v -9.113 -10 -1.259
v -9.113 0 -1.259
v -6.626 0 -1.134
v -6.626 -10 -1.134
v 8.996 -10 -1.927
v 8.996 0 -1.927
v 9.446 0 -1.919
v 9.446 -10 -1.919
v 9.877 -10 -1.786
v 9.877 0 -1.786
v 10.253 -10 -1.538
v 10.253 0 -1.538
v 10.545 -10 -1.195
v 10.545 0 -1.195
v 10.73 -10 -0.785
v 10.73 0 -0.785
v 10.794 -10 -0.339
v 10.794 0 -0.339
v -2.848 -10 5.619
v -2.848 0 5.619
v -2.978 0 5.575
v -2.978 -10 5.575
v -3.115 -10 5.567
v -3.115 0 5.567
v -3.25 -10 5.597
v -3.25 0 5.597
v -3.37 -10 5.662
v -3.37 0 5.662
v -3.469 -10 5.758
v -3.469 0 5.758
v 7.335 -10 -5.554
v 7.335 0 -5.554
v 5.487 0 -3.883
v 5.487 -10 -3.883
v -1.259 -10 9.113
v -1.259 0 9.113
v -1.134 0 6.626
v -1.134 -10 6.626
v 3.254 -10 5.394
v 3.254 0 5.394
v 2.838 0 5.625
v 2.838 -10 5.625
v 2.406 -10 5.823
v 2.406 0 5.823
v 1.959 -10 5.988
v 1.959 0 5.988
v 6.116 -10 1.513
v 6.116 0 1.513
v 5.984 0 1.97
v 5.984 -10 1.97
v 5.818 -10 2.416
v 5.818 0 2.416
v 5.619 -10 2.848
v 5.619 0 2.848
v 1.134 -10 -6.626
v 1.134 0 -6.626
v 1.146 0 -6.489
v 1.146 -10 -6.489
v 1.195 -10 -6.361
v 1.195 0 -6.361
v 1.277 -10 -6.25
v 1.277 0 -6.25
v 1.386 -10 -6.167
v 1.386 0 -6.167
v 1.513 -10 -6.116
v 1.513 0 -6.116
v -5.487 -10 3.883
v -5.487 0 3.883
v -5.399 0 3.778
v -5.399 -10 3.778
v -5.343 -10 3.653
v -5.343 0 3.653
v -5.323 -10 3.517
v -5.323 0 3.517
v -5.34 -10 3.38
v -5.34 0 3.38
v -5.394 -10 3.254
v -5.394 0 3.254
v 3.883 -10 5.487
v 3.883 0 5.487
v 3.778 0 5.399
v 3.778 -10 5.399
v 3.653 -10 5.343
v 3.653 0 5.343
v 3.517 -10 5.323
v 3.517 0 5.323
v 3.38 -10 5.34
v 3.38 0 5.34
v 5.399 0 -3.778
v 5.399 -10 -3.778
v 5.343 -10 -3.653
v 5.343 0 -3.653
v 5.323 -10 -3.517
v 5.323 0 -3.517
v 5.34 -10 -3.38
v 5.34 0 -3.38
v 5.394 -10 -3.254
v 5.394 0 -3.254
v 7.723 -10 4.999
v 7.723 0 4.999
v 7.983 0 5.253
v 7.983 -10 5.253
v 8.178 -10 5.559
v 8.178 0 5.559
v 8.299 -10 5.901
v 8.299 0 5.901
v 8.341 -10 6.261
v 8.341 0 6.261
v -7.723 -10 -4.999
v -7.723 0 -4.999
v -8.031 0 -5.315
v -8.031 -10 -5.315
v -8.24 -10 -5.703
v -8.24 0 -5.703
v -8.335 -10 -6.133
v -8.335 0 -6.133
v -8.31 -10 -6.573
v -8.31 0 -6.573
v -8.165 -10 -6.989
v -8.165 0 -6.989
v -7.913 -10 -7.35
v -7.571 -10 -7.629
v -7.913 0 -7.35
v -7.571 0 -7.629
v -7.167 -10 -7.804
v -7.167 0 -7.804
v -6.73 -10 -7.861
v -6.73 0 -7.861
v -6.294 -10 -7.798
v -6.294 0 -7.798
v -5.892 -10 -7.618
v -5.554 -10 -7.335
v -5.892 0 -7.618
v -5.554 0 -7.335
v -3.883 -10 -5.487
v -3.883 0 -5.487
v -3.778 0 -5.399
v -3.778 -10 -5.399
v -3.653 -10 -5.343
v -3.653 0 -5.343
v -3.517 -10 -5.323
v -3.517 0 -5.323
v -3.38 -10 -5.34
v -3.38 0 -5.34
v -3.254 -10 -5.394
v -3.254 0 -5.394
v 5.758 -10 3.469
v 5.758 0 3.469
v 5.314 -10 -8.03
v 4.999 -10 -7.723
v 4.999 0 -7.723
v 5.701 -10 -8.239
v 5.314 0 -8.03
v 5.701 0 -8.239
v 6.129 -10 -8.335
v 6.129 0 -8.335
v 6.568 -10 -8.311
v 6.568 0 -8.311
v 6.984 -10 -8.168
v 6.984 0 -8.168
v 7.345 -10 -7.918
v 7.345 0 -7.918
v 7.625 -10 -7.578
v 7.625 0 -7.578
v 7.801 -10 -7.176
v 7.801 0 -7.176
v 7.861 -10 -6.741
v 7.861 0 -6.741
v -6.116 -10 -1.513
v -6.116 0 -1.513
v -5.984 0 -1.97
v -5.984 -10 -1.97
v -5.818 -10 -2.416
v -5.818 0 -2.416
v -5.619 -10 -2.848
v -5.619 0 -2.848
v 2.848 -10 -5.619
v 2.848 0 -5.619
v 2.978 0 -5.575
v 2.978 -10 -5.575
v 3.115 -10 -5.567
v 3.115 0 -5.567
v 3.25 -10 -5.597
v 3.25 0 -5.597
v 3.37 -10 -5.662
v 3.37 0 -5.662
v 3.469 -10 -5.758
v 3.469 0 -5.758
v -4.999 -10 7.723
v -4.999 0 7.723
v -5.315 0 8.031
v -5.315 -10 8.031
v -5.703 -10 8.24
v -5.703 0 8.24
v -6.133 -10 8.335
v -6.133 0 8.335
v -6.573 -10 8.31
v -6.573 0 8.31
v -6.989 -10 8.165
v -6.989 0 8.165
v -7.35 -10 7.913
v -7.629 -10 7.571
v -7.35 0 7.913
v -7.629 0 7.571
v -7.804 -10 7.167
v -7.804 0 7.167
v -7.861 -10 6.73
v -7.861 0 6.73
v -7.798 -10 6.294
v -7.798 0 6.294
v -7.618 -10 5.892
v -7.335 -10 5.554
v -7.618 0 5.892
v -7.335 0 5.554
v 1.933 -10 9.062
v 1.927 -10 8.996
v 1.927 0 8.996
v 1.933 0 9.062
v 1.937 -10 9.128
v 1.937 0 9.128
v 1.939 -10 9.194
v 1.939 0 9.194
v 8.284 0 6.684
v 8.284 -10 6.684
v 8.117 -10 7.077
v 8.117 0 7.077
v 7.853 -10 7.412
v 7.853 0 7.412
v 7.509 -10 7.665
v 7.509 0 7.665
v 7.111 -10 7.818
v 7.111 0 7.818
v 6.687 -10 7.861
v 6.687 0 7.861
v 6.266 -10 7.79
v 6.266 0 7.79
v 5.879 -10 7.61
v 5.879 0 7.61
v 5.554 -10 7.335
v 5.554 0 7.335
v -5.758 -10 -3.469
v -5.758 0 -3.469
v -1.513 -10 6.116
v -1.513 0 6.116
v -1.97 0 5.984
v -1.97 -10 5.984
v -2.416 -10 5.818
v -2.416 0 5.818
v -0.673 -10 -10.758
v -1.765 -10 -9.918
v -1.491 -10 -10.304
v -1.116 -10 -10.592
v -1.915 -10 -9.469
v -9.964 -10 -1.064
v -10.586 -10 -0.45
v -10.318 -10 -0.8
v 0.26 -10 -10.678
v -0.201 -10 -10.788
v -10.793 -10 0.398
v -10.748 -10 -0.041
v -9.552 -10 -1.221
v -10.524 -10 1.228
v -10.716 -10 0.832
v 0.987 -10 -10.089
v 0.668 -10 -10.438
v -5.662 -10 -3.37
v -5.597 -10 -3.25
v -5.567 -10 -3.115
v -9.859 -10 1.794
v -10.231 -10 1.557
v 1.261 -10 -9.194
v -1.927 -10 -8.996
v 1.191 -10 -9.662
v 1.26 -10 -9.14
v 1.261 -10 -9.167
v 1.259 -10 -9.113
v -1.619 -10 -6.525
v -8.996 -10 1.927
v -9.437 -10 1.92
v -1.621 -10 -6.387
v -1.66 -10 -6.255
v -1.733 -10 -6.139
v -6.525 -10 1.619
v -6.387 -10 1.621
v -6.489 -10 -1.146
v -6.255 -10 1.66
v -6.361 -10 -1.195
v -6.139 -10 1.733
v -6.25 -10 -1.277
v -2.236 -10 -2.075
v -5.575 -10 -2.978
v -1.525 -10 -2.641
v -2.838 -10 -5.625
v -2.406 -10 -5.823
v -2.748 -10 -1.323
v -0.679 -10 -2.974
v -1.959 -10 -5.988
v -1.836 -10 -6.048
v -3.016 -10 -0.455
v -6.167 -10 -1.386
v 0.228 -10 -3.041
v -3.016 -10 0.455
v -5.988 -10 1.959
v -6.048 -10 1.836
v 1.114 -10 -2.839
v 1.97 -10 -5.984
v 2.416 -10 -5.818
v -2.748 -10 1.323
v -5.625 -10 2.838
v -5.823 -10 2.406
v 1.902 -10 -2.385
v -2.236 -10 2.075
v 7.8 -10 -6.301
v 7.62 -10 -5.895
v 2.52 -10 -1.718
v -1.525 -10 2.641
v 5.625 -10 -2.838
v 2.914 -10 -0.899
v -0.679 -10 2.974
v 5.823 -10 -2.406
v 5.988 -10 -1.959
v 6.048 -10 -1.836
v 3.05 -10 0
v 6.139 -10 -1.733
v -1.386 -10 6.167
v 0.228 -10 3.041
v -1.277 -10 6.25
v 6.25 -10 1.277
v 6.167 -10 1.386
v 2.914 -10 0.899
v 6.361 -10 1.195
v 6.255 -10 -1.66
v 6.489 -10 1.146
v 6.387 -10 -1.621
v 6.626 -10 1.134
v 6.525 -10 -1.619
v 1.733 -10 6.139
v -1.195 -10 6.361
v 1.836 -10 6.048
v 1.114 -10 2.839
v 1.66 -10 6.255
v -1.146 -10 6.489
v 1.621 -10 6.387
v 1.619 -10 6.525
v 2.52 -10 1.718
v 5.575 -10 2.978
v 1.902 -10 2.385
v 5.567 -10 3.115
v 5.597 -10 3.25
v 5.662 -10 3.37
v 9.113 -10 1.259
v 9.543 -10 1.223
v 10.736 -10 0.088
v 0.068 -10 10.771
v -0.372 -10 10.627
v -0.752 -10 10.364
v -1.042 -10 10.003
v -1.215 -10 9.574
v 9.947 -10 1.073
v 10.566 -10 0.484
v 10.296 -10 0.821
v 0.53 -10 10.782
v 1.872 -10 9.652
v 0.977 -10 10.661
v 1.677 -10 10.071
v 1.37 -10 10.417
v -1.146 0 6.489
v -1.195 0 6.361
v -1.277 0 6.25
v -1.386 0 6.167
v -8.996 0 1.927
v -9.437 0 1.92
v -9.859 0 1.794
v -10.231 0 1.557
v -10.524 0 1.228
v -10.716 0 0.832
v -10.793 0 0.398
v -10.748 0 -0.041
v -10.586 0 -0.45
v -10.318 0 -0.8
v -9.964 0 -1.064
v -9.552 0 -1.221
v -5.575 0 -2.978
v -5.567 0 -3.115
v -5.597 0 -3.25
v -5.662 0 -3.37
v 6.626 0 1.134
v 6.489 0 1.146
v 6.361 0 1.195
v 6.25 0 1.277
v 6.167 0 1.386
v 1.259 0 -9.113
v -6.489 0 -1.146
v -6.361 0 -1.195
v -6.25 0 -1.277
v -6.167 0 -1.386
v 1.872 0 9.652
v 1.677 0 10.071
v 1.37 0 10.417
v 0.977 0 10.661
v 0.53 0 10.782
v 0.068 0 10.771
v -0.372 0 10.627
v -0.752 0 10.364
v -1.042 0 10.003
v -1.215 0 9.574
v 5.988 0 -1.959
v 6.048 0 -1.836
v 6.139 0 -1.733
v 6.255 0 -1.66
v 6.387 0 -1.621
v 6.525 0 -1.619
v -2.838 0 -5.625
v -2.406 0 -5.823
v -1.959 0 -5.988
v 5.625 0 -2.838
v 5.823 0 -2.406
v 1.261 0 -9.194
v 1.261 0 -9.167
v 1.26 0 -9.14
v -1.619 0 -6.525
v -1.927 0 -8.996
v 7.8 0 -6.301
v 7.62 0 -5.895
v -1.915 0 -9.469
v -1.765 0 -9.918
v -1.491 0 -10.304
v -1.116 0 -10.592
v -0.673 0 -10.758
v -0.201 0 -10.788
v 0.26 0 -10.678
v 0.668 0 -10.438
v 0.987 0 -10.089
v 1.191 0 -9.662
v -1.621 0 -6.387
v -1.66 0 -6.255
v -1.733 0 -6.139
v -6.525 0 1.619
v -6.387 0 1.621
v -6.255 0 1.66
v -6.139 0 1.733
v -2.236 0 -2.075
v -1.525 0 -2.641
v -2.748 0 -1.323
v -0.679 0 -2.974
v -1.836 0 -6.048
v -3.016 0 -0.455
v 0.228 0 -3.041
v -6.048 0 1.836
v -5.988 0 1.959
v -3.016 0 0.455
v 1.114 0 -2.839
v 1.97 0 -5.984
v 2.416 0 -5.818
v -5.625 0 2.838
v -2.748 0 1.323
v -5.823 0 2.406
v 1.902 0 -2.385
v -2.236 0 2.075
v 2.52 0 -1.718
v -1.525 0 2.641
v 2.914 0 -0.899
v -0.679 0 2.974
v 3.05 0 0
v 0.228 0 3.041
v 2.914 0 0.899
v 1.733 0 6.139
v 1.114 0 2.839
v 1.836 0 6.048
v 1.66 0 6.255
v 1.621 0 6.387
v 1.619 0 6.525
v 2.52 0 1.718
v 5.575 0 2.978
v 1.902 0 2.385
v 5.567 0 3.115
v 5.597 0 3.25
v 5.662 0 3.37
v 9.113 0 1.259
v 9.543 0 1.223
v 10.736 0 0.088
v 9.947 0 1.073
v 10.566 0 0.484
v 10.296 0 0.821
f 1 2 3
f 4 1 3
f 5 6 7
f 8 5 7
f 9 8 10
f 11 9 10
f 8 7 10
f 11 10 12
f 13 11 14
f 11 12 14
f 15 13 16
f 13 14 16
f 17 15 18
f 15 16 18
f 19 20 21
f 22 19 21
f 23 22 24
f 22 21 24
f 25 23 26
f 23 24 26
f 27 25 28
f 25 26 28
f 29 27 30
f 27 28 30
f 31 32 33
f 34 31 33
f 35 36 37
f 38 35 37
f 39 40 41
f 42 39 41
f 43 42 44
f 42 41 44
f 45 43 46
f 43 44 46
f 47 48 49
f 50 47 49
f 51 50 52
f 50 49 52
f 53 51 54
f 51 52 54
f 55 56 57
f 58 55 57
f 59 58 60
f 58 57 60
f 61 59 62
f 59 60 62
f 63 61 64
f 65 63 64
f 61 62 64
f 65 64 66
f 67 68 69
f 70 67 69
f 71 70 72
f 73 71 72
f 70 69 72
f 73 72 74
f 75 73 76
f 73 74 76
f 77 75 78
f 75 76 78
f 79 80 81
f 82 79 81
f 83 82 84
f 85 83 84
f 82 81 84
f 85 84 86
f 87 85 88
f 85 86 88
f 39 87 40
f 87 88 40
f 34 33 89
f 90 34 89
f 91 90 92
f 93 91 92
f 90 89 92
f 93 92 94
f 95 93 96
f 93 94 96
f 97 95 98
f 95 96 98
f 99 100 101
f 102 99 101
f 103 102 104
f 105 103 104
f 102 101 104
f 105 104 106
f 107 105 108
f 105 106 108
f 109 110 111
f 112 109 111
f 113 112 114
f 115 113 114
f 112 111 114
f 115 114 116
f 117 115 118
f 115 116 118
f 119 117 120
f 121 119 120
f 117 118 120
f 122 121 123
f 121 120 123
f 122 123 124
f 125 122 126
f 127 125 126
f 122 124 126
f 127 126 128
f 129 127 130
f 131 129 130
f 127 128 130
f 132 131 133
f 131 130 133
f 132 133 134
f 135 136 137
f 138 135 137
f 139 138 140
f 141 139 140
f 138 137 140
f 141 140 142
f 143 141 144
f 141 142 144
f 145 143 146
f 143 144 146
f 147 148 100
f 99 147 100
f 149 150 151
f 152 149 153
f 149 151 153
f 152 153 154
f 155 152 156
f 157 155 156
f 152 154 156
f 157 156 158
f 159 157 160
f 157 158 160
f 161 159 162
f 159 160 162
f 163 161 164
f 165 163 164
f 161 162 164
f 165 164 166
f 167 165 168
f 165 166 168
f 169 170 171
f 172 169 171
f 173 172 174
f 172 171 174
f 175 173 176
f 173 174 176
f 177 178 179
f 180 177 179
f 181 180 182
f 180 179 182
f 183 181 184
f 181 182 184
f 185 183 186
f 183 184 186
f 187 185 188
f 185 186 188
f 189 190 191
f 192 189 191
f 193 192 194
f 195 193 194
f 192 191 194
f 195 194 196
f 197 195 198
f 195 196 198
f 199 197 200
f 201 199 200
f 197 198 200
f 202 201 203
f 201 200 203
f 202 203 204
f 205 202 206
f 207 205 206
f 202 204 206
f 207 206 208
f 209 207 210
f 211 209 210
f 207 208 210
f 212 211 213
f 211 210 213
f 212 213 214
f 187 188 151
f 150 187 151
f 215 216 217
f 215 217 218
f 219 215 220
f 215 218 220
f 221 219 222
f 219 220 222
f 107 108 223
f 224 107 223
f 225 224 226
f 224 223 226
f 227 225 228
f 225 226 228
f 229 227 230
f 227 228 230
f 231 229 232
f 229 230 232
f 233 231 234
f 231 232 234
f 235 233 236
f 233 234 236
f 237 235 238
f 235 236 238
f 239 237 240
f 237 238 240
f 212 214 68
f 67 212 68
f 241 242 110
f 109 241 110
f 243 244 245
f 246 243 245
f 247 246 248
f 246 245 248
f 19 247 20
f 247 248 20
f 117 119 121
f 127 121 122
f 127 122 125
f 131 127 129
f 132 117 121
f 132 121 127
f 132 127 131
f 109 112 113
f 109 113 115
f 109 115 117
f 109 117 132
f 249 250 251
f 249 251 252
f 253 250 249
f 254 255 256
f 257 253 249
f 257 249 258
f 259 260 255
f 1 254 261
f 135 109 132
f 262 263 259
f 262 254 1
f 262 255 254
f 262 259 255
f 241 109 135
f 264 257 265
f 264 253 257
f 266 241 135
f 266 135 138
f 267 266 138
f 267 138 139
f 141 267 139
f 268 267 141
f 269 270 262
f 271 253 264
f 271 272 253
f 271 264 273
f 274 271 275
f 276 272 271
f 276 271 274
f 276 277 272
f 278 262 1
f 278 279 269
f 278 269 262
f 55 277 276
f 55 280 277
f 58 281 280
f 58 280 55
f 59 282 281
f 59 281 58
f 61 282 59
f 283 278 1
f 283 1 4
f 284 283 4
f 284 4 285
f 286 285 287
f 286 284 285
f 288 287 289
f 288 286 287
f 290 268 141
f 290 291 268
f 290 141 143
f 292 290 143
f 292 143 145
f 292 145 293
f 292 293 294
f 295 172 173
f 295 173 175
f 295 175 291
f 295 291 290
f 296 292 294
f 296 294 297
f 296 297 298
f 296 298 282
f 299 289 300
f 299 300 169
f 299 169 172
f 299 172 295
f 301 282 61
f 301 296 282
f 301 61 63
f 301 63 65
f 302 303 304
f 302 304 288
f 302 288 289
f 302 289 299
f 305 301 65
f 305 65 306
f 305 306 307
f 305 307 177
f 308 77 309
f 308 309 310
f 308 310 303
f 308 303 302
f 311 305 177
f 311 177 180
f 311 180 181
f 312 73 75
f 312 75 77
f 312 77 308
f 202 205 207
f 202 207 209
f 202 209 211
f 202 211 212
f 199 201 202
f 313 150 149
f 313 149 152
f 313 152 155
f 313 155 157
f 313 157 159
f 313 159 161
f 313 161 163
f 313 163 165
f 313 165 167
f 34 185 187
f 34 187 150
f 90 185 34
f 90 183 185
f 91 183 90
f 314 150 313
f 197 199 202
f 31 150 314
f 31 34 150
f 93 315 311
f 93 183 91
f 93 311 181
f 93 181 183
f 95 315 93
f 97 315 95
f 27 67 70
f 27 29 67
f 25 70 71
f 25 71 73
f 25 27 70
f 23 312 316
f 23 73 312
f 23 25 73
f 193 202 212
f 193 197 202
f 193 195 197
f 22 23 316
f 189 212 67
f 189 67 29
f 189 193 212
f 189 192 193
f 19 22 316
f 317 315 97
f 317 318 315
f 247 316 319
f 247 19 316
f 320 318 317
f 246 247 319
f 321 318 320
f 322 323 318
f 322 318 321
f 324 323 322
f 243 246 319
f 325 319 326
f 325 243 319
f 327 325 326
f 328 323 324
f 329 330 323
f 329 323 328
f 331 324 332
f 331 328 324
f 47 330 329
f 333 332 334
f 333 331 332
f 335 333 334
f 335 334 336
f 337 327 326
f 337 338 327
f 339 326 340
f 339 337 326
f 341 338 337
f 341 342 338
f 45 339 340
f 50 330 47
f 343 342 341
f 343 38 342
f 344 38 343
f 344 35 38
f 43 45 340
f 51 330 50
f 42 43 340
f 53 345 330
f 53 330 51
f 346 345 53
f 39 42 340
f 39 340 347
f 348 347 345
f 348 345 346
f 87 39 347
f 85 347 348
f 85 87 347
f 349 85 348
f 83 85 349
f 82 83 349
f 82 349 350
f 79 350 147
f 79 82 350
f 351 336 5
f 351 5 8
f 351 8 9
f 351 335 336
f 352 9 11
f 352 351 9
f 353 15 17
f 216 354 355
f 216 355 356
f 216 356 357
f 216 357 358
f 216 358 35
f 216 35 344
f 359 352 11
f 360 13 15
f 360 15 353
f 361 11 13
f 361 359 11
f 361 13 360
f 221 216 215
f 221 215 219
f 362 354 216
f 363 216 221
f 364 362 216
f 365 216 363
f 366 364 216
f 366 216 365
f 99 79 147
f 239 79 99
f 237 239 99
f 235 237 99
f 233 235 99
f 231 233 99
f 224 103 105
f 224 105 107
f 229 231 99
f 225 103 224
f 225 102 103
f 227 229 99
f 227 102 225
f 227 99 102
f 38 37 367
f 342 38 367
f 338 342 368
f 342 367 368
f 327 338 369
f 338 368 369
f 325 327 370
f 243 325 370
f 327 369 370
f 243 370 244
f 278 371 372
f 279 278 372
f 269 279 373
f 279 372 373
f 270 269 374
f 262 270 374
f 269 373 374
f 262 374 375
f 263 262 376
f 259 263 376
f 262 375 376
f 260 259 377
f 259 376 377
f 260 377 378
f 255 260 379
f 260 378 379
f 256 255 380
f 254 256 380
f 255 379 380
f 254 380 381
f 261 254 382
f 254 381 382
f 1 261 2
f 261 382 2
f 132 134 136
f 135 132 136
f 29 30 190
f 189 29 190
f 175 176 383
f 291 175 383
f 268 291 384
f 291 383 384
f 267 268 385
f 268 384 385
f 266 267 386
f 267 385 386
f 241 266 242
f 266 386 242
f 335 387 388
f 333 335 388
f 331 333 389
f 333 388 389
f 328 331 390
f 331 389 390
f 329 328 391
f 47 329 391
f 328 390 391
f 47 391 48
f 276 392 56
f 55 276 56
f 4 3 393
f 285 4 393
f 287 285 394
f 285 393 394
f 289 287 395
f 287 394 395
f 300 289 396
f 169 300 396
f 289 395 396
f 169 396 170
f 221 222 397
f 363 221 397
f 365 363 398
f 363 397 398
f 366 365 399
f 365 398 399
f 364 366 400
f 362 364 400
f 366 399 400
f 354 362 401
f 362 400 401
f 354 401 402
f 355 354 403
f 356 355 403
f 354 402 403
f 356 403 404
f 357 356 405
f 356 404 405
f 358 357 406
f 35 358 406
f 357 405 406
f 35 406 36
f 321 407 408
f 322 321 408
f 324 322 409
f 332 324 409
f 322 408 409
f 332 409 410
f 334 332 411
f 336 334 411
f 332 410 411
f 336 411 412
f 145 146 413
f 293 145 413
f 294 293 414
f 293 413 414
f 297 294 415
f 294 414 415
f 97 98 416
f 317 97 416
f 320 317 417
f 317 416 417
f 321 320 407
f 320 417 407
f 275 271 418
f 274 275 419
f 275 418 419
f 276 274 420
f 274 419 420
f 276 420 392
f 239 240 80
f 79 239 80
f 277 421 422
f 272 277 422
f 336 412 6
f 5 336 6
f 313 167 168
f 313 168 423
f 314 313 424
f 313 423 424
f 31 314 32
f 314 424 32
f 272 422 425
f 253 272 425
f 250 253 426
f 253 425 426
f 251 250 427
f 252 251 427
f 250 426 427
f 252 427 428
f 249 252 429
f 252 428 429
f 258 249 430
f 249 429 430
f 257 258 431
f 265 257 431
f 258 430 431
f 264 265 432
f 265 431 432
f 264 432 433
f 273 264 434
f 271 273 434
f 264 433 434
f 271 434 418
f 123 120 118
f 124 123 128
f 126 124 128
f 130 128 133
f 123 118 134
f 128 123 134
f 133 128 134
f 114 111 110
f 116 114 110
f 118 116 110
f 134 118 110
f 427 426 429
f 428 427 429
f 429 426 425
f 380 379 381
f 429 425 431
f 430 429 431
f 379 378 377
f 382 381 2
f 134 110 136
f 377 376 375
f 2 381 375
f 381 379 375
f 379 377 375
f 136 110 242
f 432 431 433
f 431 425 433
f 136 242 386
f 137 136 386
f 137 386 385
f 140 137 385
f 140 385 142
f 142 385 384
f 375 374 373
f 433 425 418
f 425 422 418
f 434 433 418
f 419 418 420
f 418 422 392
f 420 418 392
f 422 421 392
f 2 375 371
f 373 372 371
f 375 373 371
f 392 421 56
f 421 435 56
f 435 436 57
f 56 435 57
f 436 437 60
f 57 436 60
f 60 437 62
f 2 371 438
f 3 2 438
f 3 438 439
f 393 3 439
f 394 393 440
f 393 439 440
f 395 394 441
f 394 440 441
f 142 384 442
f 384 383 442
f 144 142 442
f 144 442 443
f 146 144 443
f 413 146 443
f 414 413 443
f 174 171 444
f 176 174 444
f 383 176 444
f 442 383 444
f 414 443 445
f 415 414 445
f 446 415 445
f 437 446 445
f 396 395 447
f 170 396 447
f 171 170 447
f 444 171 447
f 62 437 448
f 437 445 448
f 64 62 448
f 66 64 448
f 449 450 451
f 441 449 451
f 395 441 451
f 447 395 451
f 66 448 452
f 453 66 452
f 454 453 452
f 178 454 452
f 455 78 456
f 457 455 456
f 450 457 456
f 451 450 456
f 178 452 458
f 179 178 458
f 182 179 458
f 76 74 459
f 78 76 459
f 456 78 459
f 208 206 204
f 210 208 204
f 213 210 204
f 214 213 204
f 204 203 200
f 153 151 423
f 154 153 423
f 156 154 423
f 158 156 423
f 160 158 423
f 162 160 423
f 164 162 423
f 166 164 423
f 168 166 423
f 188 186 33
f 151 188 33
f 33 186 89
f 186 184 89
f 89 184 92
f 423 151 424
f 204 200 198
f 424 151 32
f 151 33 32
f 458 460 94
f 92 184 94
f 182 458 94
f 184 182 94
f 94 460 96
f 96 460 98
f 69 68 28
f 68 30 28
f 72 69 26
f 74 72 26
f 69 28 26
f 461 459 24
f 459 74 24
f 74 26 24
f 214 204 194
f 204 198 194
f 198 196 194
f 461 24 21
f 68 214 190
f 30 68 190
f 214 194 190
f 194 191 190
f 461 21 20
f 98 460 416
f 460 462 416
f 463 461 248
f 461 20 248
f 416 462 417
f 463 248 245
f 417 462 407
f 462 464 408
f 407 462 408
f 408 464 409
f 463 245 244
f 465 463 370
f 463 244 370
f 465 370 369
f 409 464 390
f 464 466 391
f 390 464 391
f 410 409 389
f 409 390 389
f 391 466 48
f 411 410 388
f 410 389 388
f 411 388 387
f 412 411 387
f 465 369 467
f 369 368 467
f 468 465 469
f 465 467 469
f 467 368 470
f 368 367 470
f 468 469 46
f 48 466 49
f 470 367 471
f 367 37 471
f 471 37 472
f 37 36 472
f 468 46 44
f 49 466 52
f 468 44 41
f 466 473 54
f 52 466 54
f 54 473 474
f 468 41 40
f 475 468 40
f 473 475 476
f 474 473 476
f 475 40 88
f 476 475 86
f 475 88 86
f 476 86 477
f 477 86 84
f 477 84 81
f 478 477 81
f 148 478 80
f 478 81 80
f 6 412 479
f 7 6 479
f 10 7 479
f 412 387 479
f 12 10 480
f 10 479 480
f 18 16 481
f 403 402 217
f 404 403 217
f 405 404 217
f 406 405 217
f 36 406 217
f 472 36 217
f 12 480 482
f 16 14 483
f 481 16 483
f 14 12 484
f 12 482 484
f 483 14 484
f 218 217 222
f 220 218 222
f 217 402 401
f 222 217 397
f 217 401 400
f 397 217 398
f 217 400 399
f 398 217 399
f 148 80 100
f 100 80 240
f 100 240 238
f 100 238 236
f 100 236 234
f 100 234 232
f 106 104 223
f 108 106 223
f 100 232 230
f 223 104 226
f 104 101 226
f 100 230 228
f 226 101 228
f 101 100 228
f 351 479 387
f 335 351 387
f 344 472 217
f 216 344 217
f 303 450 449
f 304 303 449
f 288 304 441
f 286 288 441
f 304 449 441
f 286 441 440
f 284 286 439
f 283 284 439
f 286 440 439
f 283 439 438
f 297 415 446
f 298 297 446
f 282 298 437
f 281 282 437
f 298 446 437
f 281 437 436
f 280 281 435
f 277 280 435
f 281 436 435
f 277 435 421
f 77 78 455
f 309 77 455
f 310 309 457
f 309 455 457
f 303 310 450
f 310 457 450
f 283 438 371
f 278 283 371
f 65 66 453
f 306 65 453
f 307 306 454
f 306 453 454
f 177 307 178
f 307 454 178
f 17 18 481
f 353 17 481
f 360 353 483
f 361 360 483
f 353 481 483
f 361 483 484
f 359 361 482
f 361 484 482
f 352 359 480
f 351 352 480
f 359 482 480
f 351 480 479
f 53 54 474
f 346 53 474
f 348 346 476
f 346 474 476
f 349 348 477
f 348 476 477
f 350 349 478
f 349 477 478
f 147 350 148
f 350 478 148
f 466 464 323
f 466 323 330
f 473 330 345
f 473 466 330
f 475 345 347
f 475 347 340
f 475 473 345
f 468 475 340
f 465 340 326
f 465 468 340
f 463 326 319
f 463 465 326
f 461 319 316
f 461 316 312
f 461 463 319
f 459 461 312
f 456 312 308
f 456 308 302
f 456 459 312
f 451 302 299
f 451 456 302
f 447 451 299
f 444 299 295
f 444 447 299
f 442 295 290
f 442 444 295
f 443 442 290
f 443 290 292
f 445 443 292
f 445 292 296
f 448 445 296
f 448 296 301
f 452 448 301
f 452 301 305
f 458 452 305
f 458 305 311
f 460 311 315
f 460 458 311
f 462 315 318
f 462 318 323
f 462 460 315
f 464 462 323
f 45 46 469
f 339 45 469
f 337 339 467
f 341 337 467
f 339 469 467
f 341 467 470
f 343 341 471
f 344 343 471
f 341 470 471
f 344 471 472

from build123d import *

# Parameters (mm, degrees)
F0_R     = 3.05
F1_DEPTH = 10


with BuildPart() as f1:
    # F0 (on Front) → F1 (new body)
    with BuildSketch(Plane.XZ):
        with BuildLine():
            ThreePointArc((5.987557, -1.959377), (6.221399, -0.992066), (6.3, 0))
            ThreePointArc((6.3, 0), (6.25371, 0.762306), (6.115521, 1.513409))
            ThreePointArc((6.115521, 1.513409), (5.905269, 2.194948), (5.619331, 2.848354))
            ThreePointArc((5.619331, 2.848354), (4.615787, 4.287716), (3.254184, 5.394468))
            ThreePointArc((3.254184, 5.394468), (2.623594, 5.727718), (1.959377, 5.987557))
            ThreePointArc((1.959377, 5.987557), (0.231982, 6.295727), (-1.513409, 6.115521))
            ThreePointArc((-1.513409, 6.115521), (-2.194948, 5.905269), (-2.848354, 5.619331))
            ThreePointArc((-2.848354, 5.619331), (-4.287716, 4.615787), (-5.394468, 3.254184))
            ThreePointArc((-5.394468, 3.254184), (-5.727718, 2.623594), (-5.987557, 1.959377))
            ThreePointArc((-5.987557, 1.959377), (-6.295727, 0.231982), (-6.115521, -1.513409))
            ThreePointArc((-6.115521, -1.513409), (-5.905269, -2.194948), (-5.619331, -2.848354))
            ThreePointArc((-5.619331, -2.848354), (-4.615787, -4.287716), (-3.254184, -5.394468))
            ThreePointArc((-3.254184, -5.394468), (-2.623594, -5.727718), (-1.959377, -5.987557))
            ThreePointArc((-1.959377, -5.987557), (-0.231982, -6.295727), (1.513409, -6.115521))
            ThreePointArc((1.513409, -6.115521), (2.194948, -5.905269), (2.848354, -5.619331))
            ThreePointArc((2.848354, -5.619331), (4.287716, -4.615787), (5.394468, -3.254184))
            ThreePointArc((5.394468, -3.254184), (5.727718, -2.623594), (5.987557, -1.959377))
        make_face()
        Circle(F0_R, mode=Mode.SUBTRACT)
        with BuildLine():
            ThreePointArc((6.115521, 1.513409), (6.25371, 0.762306), (6.3, 0))
            ThreePointArc((6.3, 0), (6.221399, -0.992066), (5.987557, -1.959377))
            ThreePointArc((5.987557, -1.959377), (6.194917, -1.692674), (6.524551, -1.618716))
            Line((6.524551, -1.618716), (8.996032, -1.926502))
            ThreePointArc((8.996032, -1.926502), (7.594846, -0.279851), (9.113417, 1.259215))
            Line((9.113417, 1.259215), (6.625987, 1.134152))
            ThreePointArc((6.625987, 1.134152), (6.30269, 1.232169), (6.115521, 1.513409))
        make_face()
        with BuildLine():
            ThreePointArc((3.254184, 5.394468), (4.615787, 4.287716), (5.619331, 2.848354))
            ThreePointArc((5.619331, 2.848354), (5.577369, 3.183566), (5.758159, 3.468949))
            Line((5.758159, 3.468949), (7.723398, 4.998913))
            ThreePointArc((7.723398, 4.998913), (5.568251, 5.172483), (5.55376, 7.334559))
            Line((5.55376, 7.334559), (3.883314, 5.487247))
            ThreePointArc((3.883314, 5.487247), (3.585399, 5.32795), (3.254184, 5.394468))
        make_face()
        with BuildLine():
            ThreePointArc((5.487247, -3.883314), (5.32795, -3.585399), (5.394468, -3.254184))
            ThreePointArc((5.394468, -3.254184), (4.287716, -4.615787), (2.848354, -5.619331))
            ThreePointArc((2.848354, -5.619331), (3.183566, -5.577369), (3.468949, -5.758159))
            Line((3.468949, -5.758159), (4.998913, -7.723398))
            ThreePointArc((4.998913, -7.723398), (5.172483, -5.568251), (7.334559, -5.55376))
            Line((7.334559, -5.55376), (5.487247, -3.883314))
        make_face()
        with BuildLine():
            ThreePointArc((10.793761, -0.338767), (10.29636, 0.820662), (9.113417, 1.259215))
            ThreePointArc((9.113417, 1.259215), (7.594846, -0.279851), (8.996032, -1.926502))
            ThreePointArc((8.996032, -1.926502), (10.252919, -1.538009), (10.793761, -0.338767))
        make_face()
        with BuildLine():
            ThreePointArc((-1.513409, 6.115521), (0.231982, 6.295727), (1.959377, 5.987557))
            ThreePointArc((1.959377, 5.987557), (1.692674, 6.194917), (1.618716, 6.524551))
            Line((1.618716, 6.524551), (1.926502, 8.996032))
            ThreePointArc((1.926502, 8.996032), (0.279851, 7.594846), (-1.259215, 9.113417))
            Line((-1.259215, 9.113417), (-1.134152, 6.625987))
            ThreePointArc((-1.134152, 6.625987), (-1.232169, 6.30269), (-1.513409, 6.115521))
        make_face()
        with BuildLine():
            ThreePointArc((5.55376, 7.334559), (5.568251, 5.172483), (7.723398, 4.998913))
            ThreePointArc((7.723398, 4.998913), (8.17798, 5.558793), (8.340515, 6.261426))
            ThreePointArc((8.340515, 6.261426), (7.31549, 7.754545), (5.55376, 7.334559))
        make_face()
        with BuildLine():
            ThreePointArc((1.134152, -6.625987), (1.232169, -6.30269), (1.513409, -6.115521))
            ThreePointArc((1.513409, -6.115521), (-0.231982, -6.295727), (-1.959377, -5.987557))
            ThreePointArc((-1.959377, -5.987557), (-1.692674, -6.194917), (-1.618716, -6.524551))
            Line((-1.618716, -6.524551), (-1.926502, -8.996032))
            ThreePointArc((-1.926502, -8.996032), (-0.279851, -7.594846), (1.259215, -9.113417))
            Line((1.259215, -9.113417), (1.134152, -6.625987))
        make_face()
        with BuildLine():
            ThreePointArc((7.861426, -6.740515), (7.723789, -6.091289), (7.334559, -5.55376))
            ThreePointArc((7.334559, -5.55376), (5.172483, -5.568251), (4.998913, -7.723398))
            ThreePointArc((4.998913, -7.723398), (6.781031, -8.253793), (7.861426, -6.740515))
        make_face()
        with BuildLine():
            ThreePointArc((-5.394468, 3.254184), (-4.287716, 4.615787), (-2.848354, 5.619331))
            ThreePointArc((-2.848354, 5.619331), (-3.183566, 5.577369), (-3.468949, 5.758159))
            Line((-3.468949, 5.758159), (-4.998913, 7.723398))
            ThreePointArc((-4.998913, 7.723398), (-4.748148, 7.260119), (-4.661426, 6.740515))
            ThreePointArc((-4.661426, 6.740515), (-5.612201, 5.278152), (-7.334559, 5.55376))
            Line((-7.334559, 5.55376), (-5.487247, 3.883314))
            ThreePointArc((-5.487247, 3.883314), (-5.32795, 3.585399), (-5.394468, 3.254184))
        make_face()
        with BuildLine():
            ThreePointArc((-1.259215, 9.113417), (0.279851, 7.594846), (1.926502, 8.996032))
            ThreePointArc((1.926502, 8.996032), (1.935698, 9.094706), (1.938767, 9.193761))
            ThreePointArc((1.938767, 9.193761), (0.298582, 10.793256), (-1.259215, 9.113417))
        make_face()
        with BuildLine():
            ThreePointArc((-3.883314, -5.487247), (-3.585399, -5.32795), (-3.254184, -5.394468))
            ThreePointArc((-3.254184, -5.394468), (-4.615787, -4.287716), (-5.619331, -2.848354))
            ThreePointArc((-5.619331, -2.848354), (-5.577369, -3.183566), (-5.758159, -3.468949))
            Line((-5.758159, -3.468949), (-7.723398, -4.998913))
            ThreePointArc((-7.723398, -4.998913), (-6.037881, -4.823961), (-5.140515, -6.261426))
            ThreePointArc((-5.140515, -6.261426), (-5.247396, -6.836401), (-5.55376, -7.334559))
            Line((-5.55376, -7.334559), (-3.883314, -5.487247))
        make_face()
        with BuildLine():
            ThreePointArc((1.261233, -9.193761), (1.260729, -9.153576), (1.259215, -9.113417))
            ThreePointArc((1.259215, -9.113417), (-0.279851, -7.594846), (-1.926502, -8.996032))
            ThreePointArc((-1.926502, -8.996032), (-0.437821, -10.790692), (1.261233, -9.193761))
        make_face()
        with BuildLine():
            ThreePointArc((-6.115521, -1.513409), (-6.295727, 0.231982), (-5.987557, 1.959377))
            ThreePointArc((-5.987557, 1.959377), (-6.194917, 1.692674), (-6.524551, 1.618716))
            Line((-6.524551, 1.618716), (-8.996032, 1.926502))
            ThreePointArc((-8.996032, 1.926502), (-7.994518, 1.397925), (-7.593761, 0.338767))
            ThreePointArc((-7.593761, 0.338767), (-8.034332, -0.763833), (-9.113417, -1.259215))
            Line((-9.113417, -1.259215), (-6.625987, -1.134152))
            ThreePointArc((-6.625987, -1.134152), (-6.30269, -1.232169), (-6.115521, -1.513409))
        make_face()
        with BuildLine():
            ThreePointArc((-4.661426, 6.740515), (-4.748148, 7.260119), (-4.998913, 7.723398))
            ThreePointArc((-4.998913, 7.723398), (-7.35037, 7.912778), (-7.334559, 5.55376))
            ThreePointArc((-7.334559, 5.55376), (-5.612201, 5.278152), (-4.661426, 6.740515))
        make_face()
        with BuildLine():
            ThreePointArc((-7.723398, -4.998913), (-7.912778, -7.35037), (-5.55376, -7.334559))
            ThreePointArc((-5.55376, -7.334559), (-5.247396, -6.836401), (-5.140515, -6.261426))
            ThreePointArc((-5.140515, -6.261426), (-6.037881, -4.823961), (-7.723398, -4.998913))
        make_face()
        with BuildLine():
            ThreePointArc((-7.593761, 0.338767), (-7.994518, 1.397925), (-8.996032, 1.926502))
            ThreePointArc((-8.996032, 1.926502), (-10.792676, 0.397683), (-9.113417, -1.259215))
            ThreePointArc((-9.113417, -1.259215), (-8.034332, -0.763833), (-7.593761, 0.338767))
        make_face()
    extrude(amount=F1_DEPTH)


solid = f1.part
